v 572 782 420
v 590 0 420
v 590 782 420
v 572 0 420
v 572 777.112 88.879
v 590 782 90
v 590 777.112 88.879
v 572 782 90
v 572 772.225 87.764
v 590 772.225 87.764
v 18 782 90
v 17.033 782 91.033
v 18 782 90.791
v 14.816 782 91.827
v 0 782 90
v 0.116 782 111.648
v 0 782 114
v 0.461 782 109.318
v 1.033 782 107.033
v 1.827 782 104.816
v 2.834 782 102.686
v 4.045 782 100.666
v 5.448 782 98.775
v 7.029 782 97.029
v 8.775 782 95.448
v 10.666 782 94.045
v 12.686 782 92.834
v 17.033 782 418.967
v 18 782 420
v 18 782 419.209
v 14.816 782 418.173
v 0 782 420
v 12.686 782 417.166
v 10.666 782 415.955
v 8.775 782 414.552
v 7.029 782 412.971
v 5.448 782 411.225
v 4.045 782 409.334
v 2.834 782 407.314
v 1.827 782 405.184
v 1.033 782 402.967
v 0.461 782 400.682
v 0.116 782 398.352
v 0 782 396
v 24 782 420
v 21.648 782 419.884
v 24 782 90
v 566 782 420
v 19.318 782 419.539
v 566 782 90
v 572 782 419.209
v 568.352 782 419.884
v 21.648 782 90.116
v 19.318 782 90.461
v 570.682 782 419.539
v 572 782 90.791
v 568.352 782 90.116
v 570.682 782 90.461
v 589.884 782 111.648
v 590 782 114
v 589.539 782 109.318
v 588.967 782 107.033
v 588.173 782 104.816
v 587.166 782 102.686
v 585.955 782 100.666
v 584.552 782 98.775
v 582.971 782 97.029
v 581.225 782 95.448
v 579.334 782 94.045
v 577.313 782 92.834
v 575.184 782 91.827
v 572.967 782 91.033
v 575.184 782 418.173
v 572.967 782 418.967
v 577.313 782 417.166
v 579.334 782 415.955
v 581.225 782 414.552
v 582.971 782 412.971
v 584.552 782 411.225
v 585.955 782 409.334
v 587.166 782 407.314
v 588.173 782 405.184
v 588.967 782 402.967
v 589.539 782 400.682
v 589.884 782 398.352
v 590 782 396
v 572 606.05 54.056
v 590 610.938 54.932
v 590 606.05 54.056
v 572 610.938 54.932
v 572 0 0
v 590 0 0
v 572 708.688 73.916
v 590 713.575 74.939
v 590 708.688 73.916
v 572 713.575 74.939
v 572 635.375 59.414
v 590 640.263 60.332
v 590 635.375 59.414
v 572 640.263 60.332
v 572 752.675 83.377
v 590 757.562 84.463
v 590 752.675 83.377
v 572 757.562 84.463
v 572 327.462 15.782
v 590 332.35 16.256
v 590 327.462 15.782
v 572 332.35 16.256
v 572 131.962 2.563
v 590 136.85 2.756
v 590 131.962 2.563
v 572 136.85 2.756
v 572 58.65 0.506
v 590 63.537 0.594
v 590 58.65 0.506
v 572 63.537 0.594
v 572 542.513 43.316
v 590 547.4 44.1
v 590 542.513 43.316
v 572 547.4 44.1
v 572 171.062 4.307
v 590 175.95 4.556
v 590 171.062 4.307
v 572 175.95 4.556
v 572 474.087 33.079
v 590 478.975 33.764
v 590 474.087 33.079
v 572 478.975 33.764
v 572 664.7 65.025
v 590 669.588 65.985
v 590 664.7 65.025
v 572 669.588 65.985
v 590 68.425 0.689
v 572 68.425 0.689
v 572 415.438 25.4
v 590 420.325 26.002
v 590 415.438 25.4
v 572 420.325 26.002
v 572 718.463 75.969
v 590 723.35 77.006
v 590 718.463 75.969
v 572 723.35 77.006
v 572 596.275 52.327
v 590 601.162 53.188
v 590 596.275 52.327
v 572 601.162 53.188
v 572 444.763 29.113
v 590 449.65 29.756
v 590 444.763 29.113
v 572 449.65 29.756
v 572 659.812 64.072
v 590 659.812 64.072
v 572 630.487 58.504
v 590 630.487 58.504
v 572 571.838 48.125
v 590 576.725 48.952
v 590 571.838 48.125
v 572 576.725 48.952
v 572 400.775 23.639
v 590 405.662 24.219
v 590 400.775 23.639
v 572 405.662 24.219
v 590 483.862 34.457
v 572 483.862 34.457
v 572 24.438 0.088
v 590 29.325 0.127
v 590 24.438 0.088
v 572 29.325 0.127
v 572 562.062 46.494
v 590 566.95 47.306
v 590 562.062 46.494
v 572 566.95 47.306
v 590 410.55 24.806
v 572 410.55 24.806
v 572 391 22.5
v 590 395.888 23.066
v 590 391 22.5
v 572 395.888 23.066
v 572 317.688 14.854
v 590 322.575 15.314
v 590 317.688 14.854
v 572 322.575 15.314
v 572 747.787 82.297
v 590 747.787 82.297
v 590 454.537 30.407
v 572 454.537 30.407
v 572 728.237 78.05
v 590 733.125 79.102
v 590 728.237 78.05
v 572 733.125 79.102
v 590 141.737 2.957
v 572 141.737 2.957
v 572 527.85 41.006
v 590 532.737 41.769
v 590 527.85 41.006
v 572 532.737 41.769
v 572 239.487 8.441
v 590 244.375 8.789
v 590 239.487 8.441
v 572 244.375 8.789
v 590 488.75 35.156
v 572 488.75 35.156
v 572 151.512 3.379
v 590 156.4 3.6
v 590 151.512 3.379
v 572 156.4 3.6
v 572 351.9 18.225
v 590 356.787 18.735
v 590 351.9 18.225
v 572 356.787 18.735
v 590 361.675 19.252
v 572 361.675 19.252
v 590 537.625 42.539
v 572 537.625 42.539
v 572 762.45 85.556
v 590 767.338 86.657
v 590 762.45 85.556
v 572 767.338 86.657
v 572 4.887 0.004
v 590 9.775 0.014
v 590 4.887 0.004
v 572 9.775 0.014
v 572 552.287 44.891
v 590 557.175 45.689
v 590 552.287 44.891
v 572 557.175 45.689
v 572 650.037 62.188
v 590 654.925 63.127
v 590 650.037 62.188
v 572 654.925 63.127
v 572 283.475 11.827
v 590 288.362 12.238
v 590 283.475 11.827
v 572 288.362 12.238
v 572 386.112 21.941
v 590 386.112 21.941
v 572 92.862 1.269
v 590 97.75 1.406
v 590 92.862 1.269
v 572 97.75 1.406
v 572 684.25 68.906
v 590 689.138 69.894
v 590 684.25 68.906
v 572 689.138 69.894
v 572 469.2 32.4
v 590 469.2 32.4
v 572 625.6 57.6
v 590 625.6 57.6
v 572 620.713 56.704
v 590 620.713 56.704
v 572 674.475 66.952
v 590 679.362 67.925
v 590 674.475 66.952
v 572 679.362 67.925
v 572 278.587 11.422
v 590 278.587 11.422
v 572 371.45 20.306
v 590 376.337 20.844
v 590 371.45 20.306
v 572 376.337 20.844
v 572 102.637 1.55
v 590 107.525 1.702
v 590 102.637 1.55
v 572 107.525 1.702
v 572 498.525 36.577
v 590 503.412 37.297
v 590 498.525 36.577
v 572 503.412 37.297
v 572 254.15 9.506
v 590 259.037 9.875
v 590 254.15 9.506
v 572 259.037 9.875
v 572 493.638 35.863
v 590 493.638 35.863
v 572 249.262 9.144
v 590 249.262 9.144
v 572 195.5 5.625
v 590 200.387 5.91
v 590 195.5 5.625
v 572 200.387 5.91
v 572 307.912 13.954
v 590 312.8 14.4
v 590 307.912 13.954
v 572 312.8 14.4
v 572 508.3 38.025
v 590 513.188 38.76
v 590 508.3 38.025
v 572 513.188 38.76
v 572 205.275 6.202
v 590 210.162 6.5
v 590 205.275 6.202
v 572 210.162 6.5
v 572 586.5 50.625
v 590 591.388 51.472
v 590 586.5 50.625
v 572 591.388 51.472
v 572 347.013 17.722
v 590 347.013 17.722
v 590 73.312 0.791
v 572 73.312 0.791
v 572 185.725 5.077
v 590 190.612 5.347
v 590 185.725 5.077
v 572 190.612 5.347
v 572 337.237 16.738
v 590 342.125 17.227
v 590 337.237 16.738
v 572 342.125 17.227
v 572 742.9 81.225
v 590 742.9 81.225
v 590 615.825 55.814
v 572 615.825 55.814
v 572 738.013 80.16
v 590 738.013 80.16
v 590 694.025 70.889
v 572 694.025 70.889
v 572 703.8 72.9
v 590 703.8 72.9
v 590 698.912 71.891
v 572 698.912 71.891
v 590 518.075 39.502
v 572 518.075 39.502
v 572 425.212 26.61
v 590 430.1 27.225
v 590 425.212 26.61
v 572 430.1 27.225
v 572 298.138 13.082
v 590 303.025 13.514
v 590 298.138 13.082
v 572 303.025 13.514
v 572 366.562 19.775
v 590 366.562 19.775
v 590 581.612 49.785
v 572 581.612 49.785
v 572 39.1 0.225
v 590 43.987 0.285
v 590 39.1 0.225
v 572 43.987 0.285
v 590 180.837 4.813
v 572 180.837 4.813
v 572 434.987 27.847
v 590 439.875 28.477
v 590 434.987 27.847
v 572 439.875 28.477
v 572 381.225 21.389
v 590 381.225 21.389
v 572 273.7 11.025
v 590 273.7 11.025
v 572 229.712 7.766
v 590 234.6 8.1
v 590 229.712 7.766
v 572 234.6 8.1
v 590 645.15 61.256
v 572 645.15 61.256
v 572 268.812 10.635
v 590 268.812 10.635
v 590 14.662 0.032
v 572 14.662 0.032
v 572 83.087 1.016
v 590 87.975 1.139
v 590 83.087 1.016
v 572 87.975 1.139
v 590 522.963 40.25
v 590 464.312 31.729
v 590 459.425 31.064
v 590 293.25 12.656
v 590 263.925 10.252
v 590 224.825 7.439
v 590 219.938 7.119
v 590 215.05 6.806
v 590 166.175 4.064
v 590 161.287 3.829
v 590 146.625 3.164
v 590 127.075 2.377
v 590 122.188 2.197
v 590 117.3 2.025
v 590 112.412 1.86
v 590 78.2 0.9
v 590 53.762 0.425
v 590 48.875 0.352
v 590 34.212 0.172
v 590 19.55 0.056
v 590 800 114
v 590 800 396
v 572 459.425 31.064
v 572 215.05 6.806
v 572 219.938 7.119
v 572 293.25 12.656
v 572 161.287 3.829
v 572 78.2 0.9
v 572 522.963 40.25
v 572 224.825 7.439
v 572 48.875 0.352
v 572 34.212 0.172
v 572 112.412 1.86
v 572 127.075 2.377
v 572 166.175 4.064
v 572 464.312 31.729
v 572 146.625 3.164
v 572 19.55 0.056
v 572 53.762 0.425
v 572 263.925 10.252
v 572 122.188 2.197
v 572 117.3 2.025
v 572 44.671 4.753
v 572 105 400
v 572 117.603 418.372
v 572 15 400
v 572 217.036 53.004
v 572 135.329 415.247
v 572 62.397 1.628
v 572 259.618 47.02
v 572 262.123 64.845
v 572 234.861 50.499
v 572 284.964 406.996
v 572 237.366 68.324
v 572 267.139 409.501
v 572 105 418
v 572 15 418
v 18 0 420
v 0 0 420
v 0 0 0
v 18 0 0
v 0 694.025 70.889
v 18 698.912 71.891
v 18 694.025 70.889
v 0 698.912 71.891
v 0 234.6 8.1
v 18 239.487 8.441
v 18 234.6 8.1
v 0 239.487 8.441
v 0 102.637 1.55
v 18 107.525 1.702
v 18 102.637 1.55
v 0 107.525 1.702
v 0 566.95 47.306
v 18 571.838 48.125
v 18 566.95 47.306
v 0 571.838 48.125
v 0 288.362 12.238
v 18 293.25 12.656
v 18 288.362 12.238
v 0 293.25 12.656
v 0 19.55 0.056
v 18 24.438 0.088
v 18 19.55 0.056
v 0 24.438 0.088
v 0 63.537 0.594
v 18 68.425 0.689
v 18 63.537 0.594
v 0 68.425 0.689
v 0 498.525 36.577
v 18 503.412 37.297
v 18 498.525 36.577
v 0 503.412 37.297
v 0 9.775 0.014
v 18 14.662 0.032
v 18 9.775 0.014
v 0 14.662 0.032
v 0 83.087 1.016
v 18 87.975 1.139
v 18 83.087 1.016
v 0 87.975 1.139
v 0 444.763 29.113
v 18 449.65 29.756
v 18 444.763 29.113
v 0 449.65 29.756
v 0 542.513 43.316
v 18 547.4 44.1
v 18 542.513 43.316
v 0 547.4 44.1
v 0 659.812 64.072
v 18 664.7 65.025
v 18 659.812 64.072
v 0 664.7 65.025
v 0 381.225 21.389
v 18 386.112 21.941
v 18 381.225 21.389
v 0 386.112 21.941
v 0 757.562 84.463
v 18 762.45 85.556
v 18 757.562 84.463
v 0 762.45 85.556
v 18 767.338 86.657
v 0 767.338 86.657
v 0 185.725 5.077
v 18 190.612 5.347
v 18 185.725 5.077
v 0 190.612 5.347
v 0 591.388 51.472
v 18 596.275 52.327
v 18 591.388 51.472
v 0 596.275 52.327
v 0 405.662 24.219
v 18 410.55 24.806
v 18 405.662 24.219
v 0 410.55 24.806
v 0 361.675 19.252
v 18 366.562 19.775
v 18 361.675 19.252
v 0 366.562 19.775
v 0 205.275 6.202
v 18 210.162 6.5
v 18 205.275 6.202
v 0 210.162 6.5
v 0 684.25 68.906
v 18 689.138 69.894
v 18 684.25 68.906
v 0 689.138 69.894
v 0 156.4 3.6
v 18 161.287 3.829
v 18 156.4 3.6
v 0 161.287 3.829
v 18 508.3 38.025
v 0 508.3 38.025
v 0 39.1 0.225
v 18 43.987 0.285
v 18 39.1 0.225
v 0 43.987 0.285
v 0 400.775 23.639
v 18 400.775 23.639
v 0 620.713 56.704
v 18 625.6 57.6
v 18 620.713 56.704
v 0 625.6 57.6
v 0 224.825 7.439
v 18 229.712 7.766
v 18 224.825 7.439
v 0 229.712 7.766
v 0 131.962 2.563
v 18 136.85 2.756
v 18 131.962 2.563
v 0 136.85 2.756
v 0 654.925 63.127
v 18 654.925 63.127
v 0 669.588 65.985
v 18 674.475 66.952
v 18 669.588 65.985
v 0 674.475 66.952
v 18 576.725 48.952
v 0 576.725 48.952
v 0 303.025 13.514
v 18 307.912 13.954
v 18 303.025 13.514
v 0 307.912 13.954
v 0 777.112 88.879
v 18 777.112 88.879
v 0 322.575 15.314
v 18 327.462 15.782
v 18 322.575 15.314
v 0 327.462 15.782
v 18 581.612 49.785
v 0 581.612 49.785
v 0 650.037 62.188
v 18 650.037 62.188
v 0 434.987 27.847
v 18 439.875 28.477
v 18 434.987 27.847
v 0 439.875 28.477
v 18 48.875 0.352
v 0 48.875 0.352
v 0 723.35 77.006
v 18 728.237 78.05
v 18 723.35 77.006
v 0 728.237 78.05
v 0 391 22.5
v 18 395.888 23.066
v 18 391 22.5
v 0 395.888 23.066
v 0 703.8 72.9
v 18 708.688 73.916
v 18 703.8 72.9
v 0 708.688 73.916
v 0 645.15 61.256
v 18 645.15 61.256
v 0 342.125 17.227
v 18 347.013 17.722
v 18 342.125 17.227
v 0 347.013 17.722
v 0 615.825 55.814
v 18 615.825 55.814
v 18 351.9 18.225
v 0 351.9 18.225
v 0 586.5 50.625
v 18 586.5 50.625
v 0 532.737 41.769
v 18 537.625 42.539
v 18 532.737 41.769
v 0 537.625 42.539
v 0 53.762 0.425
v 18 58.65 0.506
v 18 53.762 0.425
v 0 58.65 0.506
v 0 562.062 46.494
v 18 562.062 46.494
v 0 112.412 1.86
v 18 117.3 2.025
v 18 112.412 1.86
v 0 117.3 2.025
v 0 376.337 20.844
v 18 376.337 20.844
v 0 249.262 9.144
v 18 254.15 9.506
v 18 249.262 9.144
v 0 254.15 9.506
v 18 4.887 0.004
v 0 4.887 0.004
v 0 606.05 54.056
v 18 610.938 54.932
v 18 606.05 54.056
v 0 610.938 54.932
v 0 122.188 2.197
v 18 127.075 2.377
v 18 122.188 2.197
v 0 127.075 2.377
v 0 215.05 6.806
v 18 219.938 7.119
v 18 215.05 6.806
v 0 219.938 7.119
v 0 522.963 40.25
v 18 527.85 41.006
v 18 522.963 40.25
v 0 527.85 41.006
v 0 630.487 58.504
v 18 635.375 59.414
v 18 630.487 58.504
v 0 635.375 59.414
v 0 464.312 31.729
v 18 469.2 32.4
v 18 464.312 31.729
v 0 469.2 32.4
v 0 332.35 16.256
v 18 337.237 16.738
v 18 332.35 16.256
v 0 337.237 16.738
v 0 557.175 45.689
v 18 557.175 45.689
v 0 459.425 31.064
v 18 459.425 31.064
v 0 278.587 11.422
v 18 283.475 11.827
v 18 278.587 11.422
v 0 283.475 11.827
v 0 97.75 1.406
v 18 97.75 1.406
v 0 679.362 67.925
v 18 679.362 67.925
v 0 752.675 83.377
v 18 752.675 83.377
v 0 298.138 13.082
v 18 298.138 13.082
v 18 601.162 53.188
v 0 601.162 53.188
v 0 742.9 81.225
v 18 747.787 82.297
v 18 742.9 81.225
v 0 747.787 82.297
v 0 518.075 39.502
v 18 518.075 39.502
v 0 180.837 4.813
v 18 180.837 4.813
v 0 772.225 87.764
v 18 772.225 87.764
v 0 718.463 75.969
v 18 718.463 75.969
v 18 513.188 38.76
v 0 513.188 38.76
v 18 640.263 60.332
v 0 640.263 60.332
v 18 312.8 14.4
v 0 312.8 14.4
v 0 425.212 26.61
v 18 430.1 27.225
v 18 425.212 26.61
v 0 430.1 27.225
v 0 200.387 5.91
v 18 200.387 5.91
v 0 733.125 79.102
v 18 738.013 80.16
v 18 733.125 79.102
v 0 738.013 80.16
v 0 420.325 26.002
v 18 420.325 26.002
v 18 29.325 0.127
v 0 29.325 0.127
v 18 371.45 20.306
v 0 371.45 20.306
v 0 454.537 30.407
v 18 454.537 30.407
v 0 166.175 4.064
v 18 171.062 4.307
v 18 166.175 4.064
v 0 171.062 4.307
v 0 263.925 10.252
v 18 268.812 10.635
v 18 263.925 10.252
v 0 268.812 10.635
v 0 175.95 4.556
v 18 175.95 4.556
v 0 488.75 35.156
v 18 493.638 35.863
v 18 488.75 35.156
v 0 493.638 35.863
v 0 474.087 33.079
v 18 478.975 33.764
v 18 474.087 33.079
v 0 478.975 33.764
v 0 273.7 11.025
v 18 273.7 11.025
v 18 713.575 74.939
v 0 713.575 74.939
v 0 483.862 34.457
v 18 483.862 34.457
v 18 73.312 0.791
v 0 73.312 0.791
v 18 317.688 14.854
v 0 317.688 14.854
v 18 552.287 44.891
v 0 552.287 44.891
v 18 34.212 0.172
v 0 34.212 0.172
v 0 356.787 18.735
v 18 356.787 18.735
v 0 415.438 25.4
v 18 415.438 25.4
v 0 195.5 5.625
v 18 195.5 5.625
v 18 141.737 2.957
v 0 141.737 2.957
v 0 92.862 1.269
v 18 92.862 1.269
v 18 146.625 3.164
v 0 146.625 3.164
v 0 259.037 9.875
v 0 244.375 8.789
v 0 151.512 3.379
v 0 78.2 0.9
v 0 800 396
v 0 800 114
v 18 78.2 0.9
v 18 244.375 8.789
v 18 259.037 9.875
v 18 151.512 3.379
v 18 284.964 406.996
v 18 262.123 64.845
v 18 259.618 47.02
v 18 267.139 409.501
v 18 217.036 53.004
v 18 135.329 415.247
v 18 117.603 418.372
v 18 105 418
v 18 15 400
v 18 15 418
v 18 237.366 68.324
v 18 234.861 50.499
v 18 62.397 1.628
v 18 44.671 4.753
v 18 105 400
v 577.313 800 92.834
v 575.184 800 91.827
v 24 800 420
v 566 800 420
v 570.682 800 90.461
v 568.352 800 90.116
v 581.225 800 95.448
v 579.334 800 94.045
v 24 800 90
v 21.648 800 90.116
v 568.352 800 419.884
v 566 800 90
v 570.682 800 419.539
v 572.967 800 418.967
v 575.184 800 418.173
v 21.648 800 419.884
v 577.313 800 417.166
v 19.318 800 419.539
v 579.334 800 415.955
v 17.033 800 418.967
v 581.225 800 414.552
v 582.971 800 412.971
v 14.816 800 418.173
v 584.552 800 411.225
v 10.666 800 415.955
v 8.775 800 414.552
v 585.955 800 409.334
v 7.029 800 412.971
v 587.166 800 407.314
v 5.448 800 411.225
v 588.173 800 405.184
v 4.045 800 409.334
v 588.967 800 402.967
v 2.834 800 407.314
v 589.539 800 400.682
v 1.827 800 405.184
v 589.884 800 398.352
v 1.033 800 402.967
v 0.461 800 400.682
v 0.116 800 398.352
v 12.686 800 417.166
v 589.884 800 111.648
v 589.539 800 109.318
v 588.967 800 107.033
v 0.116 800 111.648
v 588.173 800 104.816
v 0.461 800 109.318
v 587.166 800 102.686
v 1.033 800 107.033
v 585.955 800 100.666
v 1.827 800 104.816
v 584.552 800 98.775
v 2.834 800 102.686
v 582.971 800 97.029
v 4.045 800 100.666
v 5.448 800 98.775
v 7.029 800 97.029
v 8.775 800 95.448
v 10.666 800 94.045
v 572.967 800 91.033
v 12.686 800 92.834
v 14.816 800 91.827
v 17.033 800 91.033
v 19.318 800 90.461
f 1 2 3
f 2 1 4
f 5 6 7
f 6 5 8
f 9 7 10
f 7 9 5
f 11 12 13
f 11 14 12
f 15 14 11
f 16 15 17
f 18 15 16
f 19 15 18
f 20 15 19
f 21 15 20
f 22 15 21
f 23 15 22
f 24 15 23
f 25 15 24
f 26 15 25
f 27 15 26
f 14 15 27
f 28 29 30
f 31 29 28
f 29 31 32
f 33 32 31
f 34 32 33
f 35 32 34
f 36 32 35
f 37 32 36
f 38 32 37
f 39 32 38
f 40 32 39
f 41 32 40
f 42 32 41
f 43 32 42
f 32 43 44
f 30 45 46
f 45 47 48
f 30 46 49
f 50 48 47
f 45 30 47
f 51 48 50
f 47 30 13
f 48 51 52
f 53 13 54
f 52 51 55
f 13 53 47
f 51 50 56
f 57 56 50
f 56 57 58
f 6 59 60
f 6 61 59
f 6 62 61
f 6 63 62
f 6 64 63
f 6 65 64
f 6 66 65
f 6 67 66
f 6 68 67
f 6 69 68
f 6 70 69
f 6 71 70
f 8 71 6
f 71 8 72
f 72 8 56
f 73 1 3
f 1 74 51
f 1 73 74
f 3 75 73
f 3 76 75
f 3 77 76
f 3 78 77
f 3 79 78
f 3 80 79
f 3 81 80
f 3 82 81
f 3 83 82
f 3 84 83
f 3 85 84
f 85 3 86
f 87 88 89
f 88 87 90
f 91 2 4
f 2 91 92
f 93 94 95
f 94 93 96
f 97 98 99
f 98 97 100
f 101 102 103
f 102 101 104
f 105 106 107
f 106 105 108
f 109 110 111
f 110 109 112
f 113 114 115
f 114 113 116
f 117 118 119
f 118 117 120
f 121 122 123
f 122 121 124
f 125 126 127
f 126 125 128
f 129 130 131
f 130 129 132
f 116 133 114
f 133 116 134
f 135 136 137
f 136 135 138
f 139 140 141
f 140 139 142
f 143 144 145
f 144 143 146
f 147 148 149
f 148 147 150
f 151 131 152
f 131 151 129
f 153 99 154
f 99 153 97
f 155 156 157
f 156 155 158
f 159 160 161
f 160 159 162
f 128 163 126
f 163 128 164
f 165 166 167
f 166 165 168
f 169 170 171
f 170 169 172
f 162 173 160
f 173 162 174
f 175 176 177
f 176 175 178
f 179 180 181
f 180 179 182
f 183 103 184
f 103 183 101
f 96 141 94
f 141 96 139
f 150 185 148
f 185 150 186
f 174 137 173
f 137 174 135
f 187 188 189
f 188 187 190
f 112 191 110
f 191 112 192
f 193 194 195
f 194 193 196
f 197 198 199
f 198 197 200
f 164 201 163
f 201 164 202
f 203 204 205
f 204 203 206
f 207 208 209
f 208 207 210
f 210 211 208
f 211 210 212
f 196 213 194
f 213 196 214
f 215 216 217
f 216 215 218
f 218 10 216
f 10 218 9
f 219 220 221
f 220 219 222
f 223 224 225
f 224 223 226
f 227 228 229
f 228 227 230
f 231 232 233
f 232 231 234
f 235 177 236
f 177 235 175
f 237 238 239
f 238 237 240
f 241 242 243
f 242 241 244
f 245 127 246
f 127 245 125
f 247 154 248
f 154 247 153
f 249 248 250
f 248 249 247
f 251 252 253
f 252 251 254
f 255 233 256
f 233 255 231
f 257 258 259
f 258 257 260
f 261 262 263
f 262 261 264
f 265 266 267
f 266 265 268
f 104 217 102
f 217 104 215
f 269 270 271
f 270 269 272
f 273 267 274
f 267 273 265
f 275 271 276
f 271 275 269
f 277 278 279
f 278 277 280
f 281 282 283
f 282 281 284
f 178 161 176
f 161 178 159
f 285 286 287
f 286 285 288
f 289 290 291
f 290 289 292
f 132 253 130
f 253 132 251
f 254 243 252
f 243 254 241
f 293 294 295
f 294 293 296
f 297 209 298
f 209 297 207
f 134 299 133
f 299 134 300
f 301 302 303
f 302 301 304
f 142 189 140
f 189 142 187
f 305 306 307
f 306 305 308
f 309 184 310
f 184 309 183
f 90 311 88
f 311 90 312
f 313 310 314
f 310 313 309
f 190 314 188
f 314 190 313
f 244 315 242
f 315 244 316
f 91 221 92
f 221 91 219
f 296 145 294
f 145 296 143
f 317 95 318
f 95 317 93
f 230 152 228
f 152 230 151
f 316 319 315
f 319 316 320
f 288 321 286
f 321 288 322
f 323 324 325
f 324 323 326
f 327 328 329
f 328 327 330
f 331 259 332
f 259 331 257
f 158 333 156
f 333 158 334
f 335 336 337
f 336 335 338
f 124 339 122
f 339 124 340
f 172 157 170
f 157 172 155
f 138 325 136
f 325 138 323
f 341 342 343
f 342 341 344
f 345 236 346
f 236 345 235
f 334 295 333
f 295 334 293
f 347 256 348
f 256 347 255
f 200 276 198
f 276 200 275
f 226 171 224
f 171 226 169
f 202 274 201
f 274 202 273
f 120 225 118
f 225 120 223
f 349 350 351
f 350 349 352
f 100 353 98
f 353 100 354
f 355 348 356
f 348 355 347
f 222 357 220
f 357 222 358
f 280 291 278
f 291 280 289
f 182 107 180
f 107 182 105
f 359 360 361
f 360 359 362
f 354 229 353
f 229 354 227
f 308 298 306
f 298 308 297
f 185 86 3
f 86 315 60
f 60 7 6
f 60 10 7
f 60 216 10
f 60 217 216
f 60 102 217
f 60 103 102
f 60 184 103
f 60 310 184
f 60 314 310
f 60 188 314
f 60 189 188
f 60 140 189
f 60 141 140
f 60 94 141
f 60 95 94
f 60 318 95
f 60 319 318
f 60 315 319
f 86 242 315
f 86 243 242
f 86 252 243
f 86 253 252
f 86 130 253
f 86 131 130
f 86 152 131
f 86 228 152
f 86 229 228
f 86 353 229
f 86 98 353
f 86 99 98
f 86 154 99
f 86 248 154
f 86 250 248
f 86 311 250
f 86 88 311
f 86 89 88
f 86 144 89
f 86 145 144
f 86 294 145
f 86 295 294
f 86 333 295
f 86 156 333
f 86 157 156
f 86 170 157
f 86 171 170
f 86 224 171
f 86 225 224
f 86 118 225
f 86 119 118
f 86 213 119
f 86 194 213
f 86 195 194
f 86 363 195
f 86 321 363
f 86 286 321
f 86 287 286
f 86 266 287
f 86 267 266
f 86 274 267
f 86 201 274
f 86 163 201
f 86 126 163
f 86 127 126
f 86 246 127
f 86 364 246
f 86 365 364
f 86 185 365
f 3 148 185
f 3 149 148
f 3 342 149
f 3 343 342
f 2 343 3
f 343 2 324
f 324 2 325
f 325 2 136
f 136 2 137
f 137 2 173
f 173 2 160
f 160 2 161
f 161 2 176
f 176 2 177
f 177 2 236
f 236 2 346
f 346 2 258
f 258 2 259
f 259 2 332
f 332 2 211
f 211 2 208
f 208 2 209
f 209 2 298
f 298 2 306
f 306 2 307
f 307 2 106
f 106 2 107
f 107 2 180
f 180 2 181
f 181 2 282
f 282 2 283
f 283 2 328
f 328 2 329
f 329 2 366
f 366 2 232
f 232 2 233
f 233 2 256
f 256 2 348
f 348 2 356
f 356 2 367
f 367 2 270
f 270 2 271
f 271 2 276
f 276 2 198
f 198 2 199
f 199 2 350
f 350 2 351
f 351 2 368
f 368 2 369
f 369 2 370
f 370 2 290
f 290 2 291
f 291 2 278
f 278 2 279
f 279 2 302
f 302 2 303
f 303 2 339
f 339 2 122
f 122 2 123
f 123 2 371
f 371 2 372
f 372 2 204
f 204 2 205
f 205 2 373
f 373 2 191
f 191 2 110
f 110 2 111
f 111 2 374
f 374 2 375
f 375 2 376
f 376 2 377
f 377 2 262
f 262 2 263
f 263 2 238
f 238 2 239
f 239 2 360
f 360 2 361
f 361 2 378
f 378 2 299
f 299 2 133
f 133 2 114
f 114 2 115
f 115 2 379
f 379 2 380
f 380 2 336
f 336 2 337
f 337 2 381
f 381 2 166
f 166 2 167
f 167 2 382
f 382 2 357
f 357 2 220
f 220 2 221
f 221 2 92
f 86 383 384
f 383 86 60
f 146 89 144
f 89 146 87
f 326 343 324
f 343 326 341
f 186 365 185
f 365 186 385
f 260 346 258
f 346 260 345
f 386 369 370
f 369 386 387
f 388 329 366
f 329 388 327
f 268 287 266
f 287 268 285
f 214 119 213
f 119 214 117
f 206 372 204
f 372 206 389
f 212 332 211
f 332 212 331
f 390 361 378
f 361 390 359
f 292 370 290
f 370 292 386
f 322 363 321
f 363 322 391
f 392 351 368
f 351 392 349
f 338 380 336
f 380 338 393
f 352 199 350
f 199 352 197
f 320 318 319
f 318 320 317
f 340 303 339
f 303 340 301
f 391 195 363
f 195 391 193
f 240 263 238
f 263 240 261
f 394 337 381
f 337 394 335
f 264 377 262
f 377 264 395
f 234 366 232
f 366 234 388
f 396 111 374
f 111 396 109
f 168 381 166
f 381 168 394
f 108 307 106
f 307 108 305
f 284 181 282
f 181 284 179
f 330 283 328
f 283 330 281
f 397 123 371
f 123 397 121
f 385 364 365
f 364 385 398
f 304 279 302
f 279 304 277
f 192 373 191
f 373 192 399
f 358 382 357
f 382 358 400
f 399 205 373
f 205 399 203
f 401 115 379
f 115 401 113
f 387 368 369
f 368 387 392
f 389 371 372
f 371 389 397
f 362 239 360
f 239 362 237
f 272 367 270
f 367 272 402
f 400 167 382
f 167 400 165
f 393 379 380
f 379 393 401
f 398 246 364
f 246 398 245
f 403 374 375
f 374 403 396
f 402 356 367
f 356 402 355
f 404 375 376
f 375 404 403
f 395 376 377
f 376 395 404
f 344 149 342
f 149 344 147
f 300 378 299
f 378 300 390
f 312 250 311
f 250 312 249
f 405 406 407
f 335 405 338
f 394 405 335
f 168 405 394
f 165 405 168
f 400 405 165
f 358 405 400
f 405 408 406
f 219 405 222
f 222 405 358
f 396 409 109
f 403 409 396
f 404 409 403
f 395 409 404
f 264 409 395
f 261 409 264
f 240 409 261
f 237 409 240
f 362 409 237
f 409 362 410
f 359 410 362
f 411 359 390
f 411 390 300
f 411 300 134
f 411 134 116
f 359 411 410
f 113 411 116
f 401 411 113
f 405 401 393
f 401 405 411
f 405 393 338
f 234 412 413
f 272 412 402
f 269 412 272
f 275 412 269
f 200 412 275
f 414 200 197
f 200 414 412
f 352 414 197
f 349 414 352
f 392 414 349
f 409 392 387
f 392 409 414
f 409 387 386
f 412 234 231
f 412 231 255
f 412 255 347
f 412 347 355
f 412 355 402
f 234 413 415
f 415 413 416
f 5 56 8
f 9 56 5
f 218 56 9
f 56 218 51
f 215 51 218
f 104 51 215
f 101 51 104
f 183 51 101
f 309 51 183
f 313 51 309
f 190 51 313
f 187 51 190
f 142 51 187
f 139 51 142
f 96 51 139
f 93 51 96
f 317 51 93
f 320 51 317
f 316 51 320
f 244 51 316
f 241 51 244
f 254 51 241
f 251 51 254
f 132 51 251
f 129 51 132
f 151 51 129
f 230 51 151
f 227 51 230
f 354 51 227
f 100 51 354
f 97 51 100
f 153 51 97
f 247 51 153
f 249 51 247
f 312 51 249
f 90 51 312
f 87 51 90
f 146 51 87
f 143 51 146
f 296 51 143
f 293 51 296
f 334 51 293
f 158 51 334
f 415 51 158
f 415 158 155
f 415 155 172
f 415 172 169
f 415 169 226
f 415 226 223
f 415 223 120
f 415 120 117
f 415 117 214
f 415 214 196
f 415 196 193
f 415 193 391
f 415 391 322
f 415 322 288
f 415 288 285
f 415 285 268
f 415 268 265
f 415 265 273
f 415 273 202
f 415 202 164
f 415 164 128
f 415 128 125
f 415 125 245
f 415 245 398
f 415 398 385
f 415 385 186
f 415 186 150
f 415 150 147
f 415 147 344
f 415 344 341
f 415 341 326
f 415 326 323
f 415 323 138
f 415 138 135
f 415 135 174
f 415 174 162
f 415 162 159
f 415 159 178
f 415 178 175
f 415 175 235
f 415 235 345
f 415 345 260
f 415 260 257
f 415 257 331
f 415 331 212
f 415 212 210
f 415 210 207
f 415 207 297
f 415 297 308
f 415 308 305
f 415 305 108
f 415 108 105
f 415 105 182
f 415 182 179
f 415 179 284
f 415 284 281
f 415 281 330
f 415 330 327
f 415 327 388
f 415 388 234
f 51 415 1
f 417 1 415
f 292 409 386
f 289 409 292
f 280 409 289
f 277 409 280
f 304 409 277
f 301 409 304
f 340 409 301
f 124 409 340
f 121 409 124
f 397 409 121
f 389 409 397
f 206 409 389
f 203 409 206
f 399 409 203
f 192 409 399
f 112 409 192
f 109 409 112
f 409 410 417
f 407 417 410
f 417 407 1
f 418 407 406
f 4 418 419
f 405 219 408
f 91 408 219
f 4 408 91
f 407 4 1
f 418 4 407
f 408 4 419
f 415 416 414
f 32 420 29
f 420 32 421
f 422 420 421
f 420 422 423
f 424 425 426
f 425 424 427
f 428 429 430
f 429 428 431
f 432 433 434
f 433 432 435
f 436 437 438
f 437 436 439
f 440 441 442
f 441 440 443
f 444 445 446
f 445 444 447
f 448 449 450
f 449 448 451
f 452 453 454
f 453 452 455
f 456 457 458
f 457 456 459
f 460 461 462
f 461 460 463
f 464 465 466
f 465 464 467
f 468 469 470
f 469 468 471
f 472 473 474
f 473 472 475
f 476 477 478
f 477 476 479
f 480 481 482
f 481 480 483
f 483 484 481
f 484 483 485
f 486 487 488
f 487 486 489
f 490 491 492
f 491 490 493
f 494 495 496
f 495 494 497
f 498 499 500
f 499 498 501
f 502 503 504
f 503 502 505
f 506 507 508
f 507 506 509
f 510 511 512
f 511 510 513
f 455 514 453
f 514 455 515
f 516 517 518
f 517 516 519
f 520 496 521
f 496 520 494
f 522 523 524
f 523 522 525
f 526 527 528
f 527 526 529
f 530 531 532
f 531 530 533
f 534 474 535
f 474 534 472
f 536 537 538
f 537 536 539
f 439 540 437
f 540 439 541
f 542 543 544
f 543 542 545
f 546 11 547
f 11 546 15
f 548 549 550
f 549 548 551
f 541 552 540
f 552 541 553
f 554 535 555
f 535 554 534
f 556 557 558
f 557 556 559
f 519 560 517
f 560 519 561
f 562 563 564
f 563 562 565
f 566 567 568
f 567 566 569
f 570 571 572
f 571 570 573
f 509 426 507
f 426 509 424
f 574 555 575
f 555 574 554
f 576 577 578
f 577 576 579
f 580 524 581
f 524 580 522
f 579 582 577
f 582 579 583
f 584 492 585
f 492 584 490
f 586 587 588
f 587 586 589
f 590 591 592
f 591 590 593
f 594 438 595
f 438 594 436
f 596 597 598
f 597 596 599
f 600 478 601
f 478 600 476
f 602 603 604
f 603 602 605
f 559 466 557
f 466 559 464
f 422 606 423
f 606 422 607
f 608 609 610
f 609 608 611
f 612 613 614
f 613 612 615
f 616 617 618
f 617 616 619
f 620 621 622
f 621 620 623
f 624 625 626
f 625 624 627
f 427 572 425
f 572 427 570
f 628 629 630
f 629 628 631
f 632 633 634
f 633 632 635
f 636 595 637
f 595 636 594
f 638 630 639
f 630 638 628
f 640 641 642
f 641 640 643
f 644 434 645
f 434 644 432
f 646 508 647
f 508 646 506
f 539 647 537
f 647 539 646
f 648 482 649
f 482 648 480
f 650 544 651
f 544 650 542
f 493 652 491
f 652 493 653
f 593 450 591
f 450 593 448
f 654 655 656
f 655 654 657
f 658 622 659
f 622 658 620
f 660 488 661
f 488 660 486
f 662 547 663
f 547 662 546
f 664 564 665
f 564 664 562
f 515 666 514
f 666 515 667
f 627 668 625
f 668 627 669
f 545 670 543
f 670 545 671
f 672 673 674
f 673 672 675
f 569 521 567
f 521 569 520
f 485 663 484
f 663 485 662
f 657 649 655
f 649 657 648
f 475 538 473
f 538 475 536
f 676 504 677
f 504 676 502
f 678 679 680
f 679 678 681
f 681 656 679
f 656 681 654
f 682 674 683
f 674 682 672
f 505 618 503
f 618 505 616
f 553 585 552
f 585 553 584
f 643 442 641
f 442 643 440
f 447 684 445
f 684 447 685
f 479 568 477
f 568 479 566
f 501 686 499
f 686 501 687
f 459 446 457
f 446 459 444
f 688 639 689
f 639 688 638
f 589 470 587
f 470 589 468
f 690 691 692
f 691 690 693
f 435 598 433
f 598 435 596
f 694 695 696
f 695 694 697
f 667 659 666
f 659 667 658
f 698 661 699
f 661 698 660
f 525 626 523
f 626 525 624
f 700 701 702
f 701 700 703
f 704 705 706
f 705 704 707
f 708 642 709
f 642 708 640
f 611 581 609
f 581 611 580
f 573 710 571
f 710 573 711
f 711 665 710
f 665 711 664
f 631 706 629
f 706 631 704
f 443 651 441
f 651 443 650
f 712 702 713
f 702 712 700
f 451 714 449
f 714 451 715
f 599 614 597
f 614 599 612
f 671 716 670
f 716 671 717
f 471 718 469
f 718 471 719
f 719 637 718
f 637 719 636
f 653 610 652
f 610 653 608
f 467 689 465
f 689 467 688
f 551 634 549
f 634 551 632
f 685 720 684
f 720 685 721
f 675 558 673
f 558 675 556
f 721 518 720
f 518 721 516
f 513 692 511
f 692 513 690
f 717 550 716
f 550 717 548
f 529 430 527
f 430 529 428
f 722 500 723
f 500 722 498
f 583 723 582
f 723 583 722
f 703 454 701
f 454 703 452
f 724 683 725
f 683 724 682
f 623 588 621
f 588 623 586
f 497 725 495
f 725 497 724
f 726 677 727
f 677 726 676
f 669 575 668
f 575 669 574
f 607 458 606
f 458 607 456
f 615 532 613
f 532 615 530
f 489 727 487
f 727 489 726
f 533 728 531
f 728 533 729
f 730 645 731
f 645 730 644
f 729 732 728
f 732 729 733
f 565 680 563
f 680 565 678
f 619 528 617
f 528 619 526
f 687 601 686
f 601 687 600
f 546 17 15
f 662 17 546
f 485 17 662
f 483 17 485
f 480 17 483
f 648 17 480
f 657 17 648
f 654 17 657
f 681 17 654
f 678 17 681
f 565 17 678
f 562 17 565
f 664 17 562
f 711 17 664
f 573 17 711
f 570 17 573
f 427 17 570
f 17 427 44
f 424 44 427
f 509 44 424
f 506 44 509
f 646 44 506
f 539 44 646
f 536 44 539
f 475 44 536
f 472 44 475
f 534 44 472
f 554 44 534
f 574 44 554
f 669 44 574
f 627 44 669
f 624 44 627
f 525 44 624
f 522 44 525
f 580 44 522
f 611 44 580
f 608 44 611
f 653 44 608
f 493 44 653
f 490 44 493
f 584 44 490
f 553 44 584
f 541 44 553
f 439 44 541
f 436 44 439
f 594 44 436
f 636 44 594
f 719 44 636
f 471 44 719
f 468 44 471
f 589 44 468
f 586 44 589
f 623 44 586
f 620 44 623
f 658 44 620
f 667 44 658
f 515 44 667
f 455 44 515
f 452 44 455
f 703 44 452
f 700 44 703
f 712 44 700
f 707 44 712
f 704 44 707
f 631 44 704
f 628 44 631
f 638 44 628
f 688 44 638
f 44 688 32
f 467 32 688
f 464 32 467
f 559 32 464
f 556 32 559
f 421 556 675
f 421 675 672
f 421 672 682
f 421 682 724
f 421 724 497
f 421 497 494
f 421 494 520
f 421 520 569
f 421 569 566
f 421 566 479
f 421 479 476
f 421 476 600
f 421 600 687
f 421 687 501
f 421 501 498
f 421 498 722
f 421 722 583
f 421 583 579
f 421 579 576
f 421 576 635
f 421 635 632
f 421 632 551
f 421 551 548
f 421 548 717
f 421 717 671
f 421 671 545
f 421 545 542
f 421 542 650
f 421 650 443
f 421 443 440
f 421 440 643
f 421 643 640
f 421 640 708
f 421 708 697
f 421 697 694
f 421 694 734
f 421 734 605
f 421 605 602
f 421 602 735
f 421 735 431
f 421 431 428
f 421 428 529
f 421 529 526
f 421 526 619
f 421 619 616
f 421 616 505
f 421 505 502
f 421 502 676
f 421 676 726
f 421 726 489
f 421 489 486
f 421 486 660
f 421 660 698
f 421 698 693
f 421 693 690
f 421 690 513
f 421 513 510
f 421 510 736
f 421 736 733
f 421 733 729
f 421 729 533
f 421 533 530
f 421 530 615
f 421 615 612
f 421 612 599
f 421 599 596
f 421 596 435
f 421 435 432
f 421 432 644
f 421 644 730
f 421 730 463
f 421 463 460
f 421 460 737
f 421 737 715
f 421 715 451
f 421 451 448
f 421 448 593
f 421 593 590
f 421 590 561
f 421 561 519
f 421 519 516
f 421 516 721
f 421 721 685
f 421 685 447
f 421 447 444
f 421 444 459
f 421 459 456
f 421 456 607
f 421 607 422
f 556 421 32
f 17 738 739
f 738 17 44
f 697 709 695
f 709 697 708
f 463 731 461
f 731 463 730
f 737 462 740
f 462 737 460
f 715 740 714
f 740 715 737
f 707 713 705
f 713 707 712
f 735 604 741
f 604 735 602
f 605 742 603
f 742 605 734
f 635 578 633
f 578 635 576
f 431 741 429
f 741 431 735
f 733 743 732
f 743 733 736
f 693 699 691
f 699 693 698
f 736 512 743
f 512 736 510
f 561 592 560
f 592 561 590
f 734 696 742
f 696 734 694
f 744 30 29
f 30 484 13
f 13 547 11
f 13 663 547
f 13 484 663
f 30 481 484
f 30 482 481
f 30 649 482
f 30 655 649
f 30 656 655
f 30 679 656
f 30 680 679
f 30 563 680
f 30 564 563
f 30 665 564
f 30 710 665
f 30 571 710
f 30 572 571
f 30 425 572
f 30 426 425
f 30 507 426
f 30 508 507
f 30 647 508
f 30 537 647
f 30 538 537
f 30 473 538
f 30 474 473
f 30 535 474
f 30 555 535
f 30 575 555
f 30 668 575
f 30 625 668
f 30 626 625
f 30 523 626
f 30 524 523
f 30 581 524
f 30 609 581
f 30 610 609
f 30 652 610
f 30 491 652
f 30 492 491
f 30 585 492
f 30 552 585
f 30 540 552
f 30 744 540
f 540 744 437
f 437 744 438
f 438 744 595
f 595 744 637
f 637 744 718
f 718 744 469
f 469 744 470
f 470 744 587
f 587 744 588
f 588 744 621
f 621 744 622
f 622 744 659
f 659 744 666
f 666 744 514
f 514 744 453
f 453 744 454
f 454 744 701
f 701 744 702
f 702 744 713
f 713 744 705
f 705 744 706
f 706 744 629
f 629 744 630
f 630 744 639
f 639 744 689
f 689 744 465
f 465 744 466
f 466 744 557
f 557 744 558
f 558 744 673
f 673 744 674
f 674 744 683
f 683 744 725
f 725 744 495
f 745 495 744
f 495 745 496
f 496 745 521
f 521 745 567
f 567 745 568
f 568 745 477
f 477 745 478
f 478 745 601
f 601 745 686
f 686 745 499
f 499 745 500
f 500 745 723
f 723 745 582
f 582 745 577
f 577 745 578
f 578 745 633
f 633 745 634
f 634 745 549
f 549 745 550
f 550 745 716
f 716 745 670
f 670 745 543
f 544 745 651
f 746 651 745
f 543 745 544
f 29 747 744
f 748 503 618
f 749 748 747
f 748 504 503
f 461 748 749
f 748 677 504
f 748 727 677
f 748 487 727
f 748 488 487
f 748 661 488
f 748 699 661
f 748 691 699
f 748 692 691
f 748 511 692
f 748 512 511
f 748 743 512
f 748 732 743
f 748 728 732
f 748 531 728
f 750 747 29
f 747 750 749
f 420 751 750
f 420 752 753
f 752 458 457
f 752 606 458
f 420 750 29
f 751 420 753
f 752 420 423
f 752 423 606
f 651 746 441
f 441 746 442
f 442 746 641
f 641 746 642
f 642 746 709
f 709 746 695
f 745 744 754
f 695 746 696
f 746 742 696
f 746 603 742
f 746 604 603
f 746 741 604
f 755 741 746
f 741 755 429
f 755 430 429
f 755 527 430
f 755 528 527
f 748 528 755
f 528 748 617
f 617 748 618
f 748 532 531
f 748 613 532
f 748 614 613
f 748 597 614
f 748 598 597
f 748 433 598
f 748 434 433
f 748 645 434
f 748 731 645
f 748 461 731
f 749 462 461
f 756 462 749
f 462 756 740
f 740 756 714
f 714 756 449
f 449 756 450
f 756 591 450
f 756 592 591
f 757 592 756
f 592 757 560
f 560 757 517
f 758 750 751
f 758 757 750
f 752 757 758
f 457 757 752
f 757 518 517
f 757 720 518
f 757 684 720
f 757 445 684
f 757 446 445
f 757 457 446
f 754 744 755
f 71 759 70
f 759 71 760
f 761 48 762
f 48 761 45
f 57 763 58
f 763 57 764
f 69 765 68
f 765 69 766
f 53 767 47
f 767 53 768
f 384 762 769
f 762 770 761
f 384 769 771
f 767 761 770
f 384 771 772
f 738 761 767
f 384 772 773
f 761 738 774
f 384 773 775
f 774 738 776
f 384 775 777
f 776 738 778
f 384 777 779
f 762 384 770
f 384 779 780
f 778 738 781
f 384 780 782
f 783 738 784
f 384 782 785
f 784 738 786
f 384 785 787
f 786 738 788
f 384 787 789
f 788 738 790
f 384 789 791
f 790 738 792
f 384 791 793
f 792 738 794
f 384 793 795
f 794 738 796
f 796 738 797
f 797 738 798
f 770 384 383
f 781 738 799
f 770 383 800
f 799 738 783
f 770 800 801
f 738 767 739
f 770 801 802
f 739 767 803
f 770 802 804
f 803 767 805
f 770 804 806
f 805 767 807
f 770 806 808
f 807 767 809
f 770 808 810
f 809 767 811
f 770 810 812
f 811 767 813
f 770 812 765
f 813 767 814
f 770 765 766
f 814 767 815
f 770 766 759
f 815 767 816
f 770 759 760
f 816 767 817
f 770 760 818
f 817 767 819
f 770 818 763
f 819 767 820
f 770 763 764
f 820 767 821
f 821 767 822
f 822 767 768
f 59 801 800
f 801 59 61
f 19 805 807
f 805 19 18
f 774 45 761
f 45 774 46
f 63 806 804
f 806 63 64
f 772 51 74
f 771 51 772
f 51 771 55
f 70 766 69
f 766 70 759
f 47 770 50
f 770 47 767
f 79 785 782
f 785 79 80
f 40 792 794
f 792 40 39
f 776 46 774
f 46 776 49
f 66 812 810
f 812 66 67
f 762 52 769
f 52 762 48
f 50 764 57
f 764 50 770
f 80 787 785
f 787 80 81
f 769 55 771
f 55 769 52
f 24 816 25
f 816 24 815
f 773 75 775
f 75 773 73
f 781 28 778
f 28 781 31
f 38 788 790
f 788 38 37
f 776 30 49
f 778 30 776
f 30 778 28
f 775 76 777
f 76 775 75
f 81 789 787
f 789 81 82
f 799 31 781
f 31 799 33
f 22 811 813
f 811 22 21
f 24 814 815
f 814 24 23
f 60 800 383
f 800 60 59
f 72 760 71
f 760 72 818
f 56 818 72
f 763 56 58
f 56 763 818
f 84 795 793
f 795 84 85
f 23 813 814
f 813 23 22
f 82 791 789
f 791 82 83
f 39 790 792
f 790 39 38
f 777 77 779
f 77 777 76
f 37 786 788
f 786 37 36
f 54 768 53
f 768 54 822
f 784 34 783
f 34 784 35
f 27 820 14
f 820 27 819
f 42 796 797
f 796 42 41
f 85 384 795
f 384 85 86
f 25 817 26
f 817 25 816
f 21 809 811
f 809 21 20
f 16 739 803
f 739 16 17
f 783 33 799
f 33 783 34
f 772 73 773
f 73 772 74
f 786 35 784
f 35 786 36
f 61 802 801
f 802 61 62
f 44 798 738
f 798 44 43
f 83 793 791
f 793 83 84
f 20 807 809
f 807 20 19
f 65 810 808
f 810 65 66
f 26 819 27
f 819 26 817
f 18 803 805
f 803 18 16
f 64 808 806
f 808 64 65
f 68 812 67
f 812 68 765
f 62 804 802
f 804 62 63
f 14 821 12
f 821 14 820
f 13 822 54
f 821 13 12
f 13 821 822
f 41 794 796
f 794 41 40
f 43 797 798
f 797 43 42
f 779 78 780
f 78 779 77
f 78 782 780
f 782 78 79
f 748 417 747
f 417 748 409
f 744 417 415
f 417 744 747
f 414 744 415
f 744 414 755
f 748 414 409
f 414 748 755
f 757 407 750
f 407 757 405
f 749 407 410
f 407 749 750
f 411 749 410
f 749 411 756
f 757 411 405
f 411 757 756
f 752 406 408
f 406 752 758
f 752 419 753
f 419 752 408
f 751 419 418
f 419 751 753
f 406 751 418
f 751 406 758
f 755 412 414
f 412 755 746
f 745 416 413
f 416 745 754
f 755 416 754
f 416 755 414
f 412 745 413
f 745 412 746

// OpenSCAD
// R5. Millimetres. Nominal assembly; dado machining not modelled.
multmatrix([[0, 0, 1, 572], [0, 1, 0, 0], [1, 0, 0, 0], [0, 0, 0, 1]]) linear_extrude(height=18) polygon([[0.0, 0.0], [0.003516, 4.8875], [0.014063, 9.775], [0.031641, 14.6625], [0.05625, 19.55], [0.087891, 24.4375], [0.126562, 29.325], [0.172266, 34.2125], [0.225, 39.1], [0.284766, 43.9875], [0.351562, 48.875], [0.425391, 53.7625], [0.50625, 58.65], [0.594141, 63.5375], [0.689062, 68.425], [0.791016, 73.3125], [0.9, 78.2], [1.016016, 83.0875], [1.139063, 87.975], [1.269141, 92.8625], [1.40625, 97.75], [1.550391, 102.6375], [1.701563, 107.525], [1.859766, 112.4125], [2.025, 117.3], [2.197266, 122.1875], [2.376563, 127.075], [2.562891, 131.9625], [2.75625, 136.85], [2.956641, 141.7375], [3.164062, 146.625], [3.378516, 151.5125], [3.6, 156.4], [3.828516, 161.2875], [4.064062, 166.175], [4.306641, 171.0625], [4.55625, 175.95], [4.812891, 180.8375], [5.076562, 185.725], [5.347266, 190.6125], [5.625, 195.5], [5.909766, 200.3875], [6.201563, 205.275], [6.500391, 210.1625], [6.80625, 215.05], [7.119141, 219.9375], [7.439062, 224.825], [7.766016, 229.7125], [8.1, 234.6], [8.441016, 239.4875], [8.789062, 244.375], [9.144141, 249.2625], [9.50625, 254.15], [9.875391, 259.0375], [10.251563, 263.925], [10.634766, 268.8125], [11.025, 273.7], [11.422266, 278.5875], [11.826562, 283.475], [12.237891, 288.3625], [12.65625, 293.25], [13.081641, 298.1375], [13.514063, 303.025], [13.953516, 307.9125], [14.4, 312.8], [14.853516, 317.6875], [15.314062, 322.575], [15.781641, 327.4625], [16.25625, 332.35], [16.737891, 337.2375], [17.226562, 342.125], [17.722266, 347.0125], [18.225, 351.9], [18.734766, 356.7875], [19.251563, 361.675], [19.775391, 366.5625], [20.30625, 371.45], [20.844141, 376.3375], [21.389062, 381.225], [21.941016, 386.1125], [22.5, 391.0], [23.066016, 395.8875], [23.639062, 400.775], [24.219141, 405.6625], [24.80625, 410.55], [25.400391, 415.4375], [26.001562, 420.325], [26.609766, 425.2125], [27.225, 430.1], [27.847266, 434.9875], [28.476562, 439.875], [29.112891, 444.7625], [29.75625, 449.65], [30.406641, 454.5375], [31.064063, 459.425], [31.728516, 464.3125], [32.4, 469.2], [33.078516, 474.0875], [33.764063, 478.975], [34.456641, 483.8625], [35.15625, 488.75], [35.862891, 493.6375], [36.576562, 498.525], [37.297266, 503.4125], [38.025, 508.3], [38.759766, 513.1875], [39.501562, 518.075], [40.250391, 522.9625], [41.00625, 527.85], [41.769141, 532.7375], [42.539062, 537.625], [43.316016, 542.5125], [44.1, 547.4], [44.891016, 552.2875], [45.689063, 557.175], [46.494141, 562.0625], [47.30625, 566.95], [48.125391, 571.8375], [48.951563, 576.725], [49.784766, 581.6125], [50.625, 586.5], [51.472266, 591.3875], [52.326562, 596.275], [53.187891, 601.1625], [54.05625, 606.05], [54.931641, 610.9375], [55.814062, 615.825], [56.703516, 620.7125], [57.6, 625.6], [58.503516, 630.4875], [59.414062, 635.375], [60.331641, 640.2625], [61.25625, 645.15], [62.187891, 650.0375], [63.126562, 654.925], [64.072266, 659.8125], [65.025, 664.7], [65.984766, 669.5875], [66.951563, 674.475], [67.925391, 679.3625], [68.90625, 684.25], [69.894141, 689.1375], [70.889062, 694.025], [71.891016, 698.9125], [72.9, 703.8], [73.916016, 708.6875], [74.939063, 713.575], [75.969141, 718.4625], [77.00625, 723.35], [78.050391, 728.2375], [79.101562, 733.125], [80.159766, 738.0125], [81.225, 742.9], [82.297266, 747.7875], [83.376563, 752.675], [84.462891, 757.5625], [85.55625, 762.45], [86.656641, 767.3375], [87.764063, 772.225], [88.878516, 777.1125], [90.0, 782.0], [420, 782], [420, 0]]);
multmatrix([[0, 0, 1, 0], [0, 1, 0, 0], [1, 0, 0, 0], [0, 0, 0, 1]]) linear_extrude(height=18) polygon([[0.0, 0.0], [0.003516, 4.8875], [0.014063, 9.775], [0.031641, 14.6625], [0.05625, 19.55], [0.087891, 24.4375], [0.126562, 29.325], [0.172266, 34.2125], [0.225, 39.1], [0.284766, 43.9875], [0.351562, 48.875], [0.425391, 53.7625], [0.50625, 58.65], [0.594141, 63.5375], [0.689062, 68.425], [0.791016, 73.3125], [0.9, 78.2], [1.016016, 83.0875], [1.139063, 87.975], [1.269141, 92.8625], [1.40625, 97.75], [1.550391, 102.6375], [1.701563, 107.525], [1.859766, 112.4125], [2.025, 117.3], [2.197266, 122.1875], [2.376563, 127.075], [2.562891, 131.9625], [2.75625, 136.85], [2.956641, 141.7375], [3.164062, 146.625], [3.378516, 151.5125], [3.6, 156.4], [3.828516, 161.2875], [4.064062, 166.175], [4.306641, 171.0625], [4.55625, 175.95], [4.812891, 180.8375], [5.076562, 185.725], [5.347266, 190.6125], [5.625, 195.5], [5.909766, 200.3875], [6.201563, 205.275], [6.500391, 210.1625], [6.80625, 215.05], [7.119141, 219.9375], [7.439062, 224.825], [7.766016, 229.7125], [8.1, 234.6], [8.441016, 239.4875], [8.789062, 244.375], [9.144141, 249.2625], [9.50625, 254.15], [9.875391, 259.0375], [10.251563, 263.925], [10.634766, 268.8125], [11.025, 273.7], [11.422266, 278.5875], [11.826562, 283.475], [12.237891, 288.3625], [12.65625, 293.25], [13.081641, 298.1375], [13.514063, 303.025], [13.953516, 307.9125], [14.4, 312.8], [14.853516, 317.6875], [15.314062, 322.575], [15.781641, 327.4625], [16.25625, 332.35], [16.737891, 337.2375], [17.226562, 342.125], [17.722266, 347.0125], [18.225, 351.9], [18.734766, 356.7875], [19.251563, 361.675], [19.775391, 366.5625], [20.30625, 371.45], [20.844141, 376.3375], [21.389062, 381.225], [21.941016, 386.1125], [22.5, 391.0], [23.066016, 395.8875], [23.639062, 400.775], [24.219141, 405.6625], [24.80625, 410.55], [25.400391, 415.4375], [26.001562, 420.325], [26.609766, 425.2125], [27.225, 430.1], [27.847266, 434.9875], [28.476562, 439.875], [29.112891, 444.7625], [29.75625, 449.65], [30.406641, 454.5375], [31.064063, 459.425], [31.728516, 464.3125], [32.4, 469.2], [33.078516, 474.0875], [33.764063, 478.975], [34.456641, 483.8625], [35.15625, 488.75], [35.862891, 493.6375], [36.576562, 498.525], [37.297266, 503.4125], [38.025, 508.3], [38.759766, 513.1875], [39.501562, 518.075], [40.250391, 522.9625], [41.00625, 527.85], [41.769141, 532.7375], [42.539062, 537.625], [43.316016, 542.5125], [44.1, 547.4], [44.891016, 552.2875], [45.689063, 557.175], [46.494141, 562.0625], [47.30625, 566.95], [48.125391, 571.8375], [48.951563, 576.725], [49.784766, 581.6125], [50.625, 586.5], [51.472266, 591.3875], [52.326562, 596.275], [53.187891, 601.1625], [54.05625, 606.05], [54.931641, 610.9375], [55.814062, 615.825], [56.703516, 620.7125], [57.6, 625.6], [58.503516, 630.4875], [59.414062, 635.375], [60.331641, 640.2625], [61.25625, 645.15], [62.187891, 650.0375], [63.126562, 654.925], [64.072266, 659.8125], [65.025, 664.7], [65.984766, 669.5875], [66.951563, 674.475], [67.925391, 679.3625], [68.90625, 684.25], [69.894141, 689.1375], [70.889062, 694.025], [71.891016, 698.9125], [72.9, 703.8], [73.916016, 708.6875], [74.939063, 713.575], [75.969141, 718.4625], [77.00625, 723.35], [78.050391, 728.2375], [79.101562, 733.125], [80.159766, 738.0125], [81.225, 742.9], [82.297266, 747.7875], [83.376563, 752.675], [84.462891, 757.5625], [85.55625, 762.45], [86.656641, 767.3375], [87.764063, 772.225], [88.878516, 777.1125], [90.0, 782.0], [420, 782], [420, 0]]);
multmatrix([[1, 0, 0, 0.0], [0, -0.0, 1.0, 782.0], [0, 1.0, 0.0, 90.0], [0, 0, 0, 1]]) linear_extrude(height=18) polygon([[0.0, 24.0], [0.115567, 21.647589], [0.461153, 19.317832], [1.033432, 17.033168], [1.826891, 14.815598], [2.83389, 12.686478], [4.044729, 10.666314], [5.447749, 8.774561], [7.029437, 7.029437], [8.774561, 5.447749], [10.666314, 4.044729], [12.686478, 2.83389], [14.815598, 1.826891], [17.033168, 1.033432], [19.317832, 0.461153], [21.647589, 0.115567], [24.0, 0.0], [566.0, 0.0], [568.352411, 0.115567], [570.682168, 0.461153], [572.966832, 1.033432], [575.184402, 1.826891], [577.313522, 2.83389], [579.333686, 4.044729], [581.225439, 5.447749], [582.970563, 7.029437], [584.552251, 8.774561], [585.955271, 10.666314], [587.16611, 12.686478], [588.173109, 14.815598], [588.966568, 17.033168], [589.538847, 19.317832], [589.884433, 21.647589], [590.0, 24.0], [590.0, 306.0], [589.884433, 308.352411], [589.538847, 310.682168], [588.966568, 312.966832], [588.173109, 315.184402], [587.16611, 317.313522], [585.955271, 319.333686], [584.552251, 321.225439], [582.970563, 322.970563], [581.225439, 324.552251], [579.333686, 325.955271], [577.313522, 327.16611], [575.184402, 328.173109], [572.966832, 328.966568], [570.682168, 329.538847], [568.352411, 329.884433], [566.0, 330.0], [24.0, 330.0], [21.647589, 329.884433], [19.317832, 329.538847], [17.033168, 328.966568], [14.815598, 328.173109], [12.686478, 327.16611], [10.666314, 325.955271], [8.774561, 324.552251], [7.029437, 322.970563], [5.447749, 321.225439], [4.044729, 319.333686], [2.83389, 317.313522], [1.826891, 315.184402], [1.033432, 312.966832], [0.461153, 310.682168], [0.115567, 308.352411], [0.0, 306.0]]);
multmatrix([[1, 0, 0, 12.0], [0, 0.13917310096006544, 0.9902680687415704, 217.0364292085141], [0, 0.9902680687415704, -0.13917310096006544, 53.00430553515792], [0, 0, 0, 1]]) linear_extrude(height=18) polygon([[0, 0], [566, 0], [566, 360], [0, 360]]);
multmatrix([[1, 0, 0, 12.0], [0, 0.17364817766693033, 0.984807753012208, 44.67061291283476], [0, 0.984807753012208, -0.17364817766693033, 4.7532054664386845], [0, 0, 0, 1]]) linear_extrude(height=18) polygon([[0, 0], [566, 0], [566, 420], [0, 420]]);
multmatrix([[1, 0, 0, 12.0], [0, 1.0, -0.0, 15.0], [0, 0.0, 1.0, 400.0], [0, 0, 0, 1]]) linear_extrude(height=18) polygon([[0, 0], [566, 0], [566, 90], [0, 90]]);
multmatrix([[1, 0, 0, 12.0], [0, 0.9902680687415704, 0.13917310096006544, 234.86125444586233], [0, -0.13917310096006544, 0.9902680687415704, 50.49918971787675], [0, 0, 0, 1]]) linear_extrude(height=18) polygon([[0, 0], [566, 0], [566, 25], [0, 25]]);
